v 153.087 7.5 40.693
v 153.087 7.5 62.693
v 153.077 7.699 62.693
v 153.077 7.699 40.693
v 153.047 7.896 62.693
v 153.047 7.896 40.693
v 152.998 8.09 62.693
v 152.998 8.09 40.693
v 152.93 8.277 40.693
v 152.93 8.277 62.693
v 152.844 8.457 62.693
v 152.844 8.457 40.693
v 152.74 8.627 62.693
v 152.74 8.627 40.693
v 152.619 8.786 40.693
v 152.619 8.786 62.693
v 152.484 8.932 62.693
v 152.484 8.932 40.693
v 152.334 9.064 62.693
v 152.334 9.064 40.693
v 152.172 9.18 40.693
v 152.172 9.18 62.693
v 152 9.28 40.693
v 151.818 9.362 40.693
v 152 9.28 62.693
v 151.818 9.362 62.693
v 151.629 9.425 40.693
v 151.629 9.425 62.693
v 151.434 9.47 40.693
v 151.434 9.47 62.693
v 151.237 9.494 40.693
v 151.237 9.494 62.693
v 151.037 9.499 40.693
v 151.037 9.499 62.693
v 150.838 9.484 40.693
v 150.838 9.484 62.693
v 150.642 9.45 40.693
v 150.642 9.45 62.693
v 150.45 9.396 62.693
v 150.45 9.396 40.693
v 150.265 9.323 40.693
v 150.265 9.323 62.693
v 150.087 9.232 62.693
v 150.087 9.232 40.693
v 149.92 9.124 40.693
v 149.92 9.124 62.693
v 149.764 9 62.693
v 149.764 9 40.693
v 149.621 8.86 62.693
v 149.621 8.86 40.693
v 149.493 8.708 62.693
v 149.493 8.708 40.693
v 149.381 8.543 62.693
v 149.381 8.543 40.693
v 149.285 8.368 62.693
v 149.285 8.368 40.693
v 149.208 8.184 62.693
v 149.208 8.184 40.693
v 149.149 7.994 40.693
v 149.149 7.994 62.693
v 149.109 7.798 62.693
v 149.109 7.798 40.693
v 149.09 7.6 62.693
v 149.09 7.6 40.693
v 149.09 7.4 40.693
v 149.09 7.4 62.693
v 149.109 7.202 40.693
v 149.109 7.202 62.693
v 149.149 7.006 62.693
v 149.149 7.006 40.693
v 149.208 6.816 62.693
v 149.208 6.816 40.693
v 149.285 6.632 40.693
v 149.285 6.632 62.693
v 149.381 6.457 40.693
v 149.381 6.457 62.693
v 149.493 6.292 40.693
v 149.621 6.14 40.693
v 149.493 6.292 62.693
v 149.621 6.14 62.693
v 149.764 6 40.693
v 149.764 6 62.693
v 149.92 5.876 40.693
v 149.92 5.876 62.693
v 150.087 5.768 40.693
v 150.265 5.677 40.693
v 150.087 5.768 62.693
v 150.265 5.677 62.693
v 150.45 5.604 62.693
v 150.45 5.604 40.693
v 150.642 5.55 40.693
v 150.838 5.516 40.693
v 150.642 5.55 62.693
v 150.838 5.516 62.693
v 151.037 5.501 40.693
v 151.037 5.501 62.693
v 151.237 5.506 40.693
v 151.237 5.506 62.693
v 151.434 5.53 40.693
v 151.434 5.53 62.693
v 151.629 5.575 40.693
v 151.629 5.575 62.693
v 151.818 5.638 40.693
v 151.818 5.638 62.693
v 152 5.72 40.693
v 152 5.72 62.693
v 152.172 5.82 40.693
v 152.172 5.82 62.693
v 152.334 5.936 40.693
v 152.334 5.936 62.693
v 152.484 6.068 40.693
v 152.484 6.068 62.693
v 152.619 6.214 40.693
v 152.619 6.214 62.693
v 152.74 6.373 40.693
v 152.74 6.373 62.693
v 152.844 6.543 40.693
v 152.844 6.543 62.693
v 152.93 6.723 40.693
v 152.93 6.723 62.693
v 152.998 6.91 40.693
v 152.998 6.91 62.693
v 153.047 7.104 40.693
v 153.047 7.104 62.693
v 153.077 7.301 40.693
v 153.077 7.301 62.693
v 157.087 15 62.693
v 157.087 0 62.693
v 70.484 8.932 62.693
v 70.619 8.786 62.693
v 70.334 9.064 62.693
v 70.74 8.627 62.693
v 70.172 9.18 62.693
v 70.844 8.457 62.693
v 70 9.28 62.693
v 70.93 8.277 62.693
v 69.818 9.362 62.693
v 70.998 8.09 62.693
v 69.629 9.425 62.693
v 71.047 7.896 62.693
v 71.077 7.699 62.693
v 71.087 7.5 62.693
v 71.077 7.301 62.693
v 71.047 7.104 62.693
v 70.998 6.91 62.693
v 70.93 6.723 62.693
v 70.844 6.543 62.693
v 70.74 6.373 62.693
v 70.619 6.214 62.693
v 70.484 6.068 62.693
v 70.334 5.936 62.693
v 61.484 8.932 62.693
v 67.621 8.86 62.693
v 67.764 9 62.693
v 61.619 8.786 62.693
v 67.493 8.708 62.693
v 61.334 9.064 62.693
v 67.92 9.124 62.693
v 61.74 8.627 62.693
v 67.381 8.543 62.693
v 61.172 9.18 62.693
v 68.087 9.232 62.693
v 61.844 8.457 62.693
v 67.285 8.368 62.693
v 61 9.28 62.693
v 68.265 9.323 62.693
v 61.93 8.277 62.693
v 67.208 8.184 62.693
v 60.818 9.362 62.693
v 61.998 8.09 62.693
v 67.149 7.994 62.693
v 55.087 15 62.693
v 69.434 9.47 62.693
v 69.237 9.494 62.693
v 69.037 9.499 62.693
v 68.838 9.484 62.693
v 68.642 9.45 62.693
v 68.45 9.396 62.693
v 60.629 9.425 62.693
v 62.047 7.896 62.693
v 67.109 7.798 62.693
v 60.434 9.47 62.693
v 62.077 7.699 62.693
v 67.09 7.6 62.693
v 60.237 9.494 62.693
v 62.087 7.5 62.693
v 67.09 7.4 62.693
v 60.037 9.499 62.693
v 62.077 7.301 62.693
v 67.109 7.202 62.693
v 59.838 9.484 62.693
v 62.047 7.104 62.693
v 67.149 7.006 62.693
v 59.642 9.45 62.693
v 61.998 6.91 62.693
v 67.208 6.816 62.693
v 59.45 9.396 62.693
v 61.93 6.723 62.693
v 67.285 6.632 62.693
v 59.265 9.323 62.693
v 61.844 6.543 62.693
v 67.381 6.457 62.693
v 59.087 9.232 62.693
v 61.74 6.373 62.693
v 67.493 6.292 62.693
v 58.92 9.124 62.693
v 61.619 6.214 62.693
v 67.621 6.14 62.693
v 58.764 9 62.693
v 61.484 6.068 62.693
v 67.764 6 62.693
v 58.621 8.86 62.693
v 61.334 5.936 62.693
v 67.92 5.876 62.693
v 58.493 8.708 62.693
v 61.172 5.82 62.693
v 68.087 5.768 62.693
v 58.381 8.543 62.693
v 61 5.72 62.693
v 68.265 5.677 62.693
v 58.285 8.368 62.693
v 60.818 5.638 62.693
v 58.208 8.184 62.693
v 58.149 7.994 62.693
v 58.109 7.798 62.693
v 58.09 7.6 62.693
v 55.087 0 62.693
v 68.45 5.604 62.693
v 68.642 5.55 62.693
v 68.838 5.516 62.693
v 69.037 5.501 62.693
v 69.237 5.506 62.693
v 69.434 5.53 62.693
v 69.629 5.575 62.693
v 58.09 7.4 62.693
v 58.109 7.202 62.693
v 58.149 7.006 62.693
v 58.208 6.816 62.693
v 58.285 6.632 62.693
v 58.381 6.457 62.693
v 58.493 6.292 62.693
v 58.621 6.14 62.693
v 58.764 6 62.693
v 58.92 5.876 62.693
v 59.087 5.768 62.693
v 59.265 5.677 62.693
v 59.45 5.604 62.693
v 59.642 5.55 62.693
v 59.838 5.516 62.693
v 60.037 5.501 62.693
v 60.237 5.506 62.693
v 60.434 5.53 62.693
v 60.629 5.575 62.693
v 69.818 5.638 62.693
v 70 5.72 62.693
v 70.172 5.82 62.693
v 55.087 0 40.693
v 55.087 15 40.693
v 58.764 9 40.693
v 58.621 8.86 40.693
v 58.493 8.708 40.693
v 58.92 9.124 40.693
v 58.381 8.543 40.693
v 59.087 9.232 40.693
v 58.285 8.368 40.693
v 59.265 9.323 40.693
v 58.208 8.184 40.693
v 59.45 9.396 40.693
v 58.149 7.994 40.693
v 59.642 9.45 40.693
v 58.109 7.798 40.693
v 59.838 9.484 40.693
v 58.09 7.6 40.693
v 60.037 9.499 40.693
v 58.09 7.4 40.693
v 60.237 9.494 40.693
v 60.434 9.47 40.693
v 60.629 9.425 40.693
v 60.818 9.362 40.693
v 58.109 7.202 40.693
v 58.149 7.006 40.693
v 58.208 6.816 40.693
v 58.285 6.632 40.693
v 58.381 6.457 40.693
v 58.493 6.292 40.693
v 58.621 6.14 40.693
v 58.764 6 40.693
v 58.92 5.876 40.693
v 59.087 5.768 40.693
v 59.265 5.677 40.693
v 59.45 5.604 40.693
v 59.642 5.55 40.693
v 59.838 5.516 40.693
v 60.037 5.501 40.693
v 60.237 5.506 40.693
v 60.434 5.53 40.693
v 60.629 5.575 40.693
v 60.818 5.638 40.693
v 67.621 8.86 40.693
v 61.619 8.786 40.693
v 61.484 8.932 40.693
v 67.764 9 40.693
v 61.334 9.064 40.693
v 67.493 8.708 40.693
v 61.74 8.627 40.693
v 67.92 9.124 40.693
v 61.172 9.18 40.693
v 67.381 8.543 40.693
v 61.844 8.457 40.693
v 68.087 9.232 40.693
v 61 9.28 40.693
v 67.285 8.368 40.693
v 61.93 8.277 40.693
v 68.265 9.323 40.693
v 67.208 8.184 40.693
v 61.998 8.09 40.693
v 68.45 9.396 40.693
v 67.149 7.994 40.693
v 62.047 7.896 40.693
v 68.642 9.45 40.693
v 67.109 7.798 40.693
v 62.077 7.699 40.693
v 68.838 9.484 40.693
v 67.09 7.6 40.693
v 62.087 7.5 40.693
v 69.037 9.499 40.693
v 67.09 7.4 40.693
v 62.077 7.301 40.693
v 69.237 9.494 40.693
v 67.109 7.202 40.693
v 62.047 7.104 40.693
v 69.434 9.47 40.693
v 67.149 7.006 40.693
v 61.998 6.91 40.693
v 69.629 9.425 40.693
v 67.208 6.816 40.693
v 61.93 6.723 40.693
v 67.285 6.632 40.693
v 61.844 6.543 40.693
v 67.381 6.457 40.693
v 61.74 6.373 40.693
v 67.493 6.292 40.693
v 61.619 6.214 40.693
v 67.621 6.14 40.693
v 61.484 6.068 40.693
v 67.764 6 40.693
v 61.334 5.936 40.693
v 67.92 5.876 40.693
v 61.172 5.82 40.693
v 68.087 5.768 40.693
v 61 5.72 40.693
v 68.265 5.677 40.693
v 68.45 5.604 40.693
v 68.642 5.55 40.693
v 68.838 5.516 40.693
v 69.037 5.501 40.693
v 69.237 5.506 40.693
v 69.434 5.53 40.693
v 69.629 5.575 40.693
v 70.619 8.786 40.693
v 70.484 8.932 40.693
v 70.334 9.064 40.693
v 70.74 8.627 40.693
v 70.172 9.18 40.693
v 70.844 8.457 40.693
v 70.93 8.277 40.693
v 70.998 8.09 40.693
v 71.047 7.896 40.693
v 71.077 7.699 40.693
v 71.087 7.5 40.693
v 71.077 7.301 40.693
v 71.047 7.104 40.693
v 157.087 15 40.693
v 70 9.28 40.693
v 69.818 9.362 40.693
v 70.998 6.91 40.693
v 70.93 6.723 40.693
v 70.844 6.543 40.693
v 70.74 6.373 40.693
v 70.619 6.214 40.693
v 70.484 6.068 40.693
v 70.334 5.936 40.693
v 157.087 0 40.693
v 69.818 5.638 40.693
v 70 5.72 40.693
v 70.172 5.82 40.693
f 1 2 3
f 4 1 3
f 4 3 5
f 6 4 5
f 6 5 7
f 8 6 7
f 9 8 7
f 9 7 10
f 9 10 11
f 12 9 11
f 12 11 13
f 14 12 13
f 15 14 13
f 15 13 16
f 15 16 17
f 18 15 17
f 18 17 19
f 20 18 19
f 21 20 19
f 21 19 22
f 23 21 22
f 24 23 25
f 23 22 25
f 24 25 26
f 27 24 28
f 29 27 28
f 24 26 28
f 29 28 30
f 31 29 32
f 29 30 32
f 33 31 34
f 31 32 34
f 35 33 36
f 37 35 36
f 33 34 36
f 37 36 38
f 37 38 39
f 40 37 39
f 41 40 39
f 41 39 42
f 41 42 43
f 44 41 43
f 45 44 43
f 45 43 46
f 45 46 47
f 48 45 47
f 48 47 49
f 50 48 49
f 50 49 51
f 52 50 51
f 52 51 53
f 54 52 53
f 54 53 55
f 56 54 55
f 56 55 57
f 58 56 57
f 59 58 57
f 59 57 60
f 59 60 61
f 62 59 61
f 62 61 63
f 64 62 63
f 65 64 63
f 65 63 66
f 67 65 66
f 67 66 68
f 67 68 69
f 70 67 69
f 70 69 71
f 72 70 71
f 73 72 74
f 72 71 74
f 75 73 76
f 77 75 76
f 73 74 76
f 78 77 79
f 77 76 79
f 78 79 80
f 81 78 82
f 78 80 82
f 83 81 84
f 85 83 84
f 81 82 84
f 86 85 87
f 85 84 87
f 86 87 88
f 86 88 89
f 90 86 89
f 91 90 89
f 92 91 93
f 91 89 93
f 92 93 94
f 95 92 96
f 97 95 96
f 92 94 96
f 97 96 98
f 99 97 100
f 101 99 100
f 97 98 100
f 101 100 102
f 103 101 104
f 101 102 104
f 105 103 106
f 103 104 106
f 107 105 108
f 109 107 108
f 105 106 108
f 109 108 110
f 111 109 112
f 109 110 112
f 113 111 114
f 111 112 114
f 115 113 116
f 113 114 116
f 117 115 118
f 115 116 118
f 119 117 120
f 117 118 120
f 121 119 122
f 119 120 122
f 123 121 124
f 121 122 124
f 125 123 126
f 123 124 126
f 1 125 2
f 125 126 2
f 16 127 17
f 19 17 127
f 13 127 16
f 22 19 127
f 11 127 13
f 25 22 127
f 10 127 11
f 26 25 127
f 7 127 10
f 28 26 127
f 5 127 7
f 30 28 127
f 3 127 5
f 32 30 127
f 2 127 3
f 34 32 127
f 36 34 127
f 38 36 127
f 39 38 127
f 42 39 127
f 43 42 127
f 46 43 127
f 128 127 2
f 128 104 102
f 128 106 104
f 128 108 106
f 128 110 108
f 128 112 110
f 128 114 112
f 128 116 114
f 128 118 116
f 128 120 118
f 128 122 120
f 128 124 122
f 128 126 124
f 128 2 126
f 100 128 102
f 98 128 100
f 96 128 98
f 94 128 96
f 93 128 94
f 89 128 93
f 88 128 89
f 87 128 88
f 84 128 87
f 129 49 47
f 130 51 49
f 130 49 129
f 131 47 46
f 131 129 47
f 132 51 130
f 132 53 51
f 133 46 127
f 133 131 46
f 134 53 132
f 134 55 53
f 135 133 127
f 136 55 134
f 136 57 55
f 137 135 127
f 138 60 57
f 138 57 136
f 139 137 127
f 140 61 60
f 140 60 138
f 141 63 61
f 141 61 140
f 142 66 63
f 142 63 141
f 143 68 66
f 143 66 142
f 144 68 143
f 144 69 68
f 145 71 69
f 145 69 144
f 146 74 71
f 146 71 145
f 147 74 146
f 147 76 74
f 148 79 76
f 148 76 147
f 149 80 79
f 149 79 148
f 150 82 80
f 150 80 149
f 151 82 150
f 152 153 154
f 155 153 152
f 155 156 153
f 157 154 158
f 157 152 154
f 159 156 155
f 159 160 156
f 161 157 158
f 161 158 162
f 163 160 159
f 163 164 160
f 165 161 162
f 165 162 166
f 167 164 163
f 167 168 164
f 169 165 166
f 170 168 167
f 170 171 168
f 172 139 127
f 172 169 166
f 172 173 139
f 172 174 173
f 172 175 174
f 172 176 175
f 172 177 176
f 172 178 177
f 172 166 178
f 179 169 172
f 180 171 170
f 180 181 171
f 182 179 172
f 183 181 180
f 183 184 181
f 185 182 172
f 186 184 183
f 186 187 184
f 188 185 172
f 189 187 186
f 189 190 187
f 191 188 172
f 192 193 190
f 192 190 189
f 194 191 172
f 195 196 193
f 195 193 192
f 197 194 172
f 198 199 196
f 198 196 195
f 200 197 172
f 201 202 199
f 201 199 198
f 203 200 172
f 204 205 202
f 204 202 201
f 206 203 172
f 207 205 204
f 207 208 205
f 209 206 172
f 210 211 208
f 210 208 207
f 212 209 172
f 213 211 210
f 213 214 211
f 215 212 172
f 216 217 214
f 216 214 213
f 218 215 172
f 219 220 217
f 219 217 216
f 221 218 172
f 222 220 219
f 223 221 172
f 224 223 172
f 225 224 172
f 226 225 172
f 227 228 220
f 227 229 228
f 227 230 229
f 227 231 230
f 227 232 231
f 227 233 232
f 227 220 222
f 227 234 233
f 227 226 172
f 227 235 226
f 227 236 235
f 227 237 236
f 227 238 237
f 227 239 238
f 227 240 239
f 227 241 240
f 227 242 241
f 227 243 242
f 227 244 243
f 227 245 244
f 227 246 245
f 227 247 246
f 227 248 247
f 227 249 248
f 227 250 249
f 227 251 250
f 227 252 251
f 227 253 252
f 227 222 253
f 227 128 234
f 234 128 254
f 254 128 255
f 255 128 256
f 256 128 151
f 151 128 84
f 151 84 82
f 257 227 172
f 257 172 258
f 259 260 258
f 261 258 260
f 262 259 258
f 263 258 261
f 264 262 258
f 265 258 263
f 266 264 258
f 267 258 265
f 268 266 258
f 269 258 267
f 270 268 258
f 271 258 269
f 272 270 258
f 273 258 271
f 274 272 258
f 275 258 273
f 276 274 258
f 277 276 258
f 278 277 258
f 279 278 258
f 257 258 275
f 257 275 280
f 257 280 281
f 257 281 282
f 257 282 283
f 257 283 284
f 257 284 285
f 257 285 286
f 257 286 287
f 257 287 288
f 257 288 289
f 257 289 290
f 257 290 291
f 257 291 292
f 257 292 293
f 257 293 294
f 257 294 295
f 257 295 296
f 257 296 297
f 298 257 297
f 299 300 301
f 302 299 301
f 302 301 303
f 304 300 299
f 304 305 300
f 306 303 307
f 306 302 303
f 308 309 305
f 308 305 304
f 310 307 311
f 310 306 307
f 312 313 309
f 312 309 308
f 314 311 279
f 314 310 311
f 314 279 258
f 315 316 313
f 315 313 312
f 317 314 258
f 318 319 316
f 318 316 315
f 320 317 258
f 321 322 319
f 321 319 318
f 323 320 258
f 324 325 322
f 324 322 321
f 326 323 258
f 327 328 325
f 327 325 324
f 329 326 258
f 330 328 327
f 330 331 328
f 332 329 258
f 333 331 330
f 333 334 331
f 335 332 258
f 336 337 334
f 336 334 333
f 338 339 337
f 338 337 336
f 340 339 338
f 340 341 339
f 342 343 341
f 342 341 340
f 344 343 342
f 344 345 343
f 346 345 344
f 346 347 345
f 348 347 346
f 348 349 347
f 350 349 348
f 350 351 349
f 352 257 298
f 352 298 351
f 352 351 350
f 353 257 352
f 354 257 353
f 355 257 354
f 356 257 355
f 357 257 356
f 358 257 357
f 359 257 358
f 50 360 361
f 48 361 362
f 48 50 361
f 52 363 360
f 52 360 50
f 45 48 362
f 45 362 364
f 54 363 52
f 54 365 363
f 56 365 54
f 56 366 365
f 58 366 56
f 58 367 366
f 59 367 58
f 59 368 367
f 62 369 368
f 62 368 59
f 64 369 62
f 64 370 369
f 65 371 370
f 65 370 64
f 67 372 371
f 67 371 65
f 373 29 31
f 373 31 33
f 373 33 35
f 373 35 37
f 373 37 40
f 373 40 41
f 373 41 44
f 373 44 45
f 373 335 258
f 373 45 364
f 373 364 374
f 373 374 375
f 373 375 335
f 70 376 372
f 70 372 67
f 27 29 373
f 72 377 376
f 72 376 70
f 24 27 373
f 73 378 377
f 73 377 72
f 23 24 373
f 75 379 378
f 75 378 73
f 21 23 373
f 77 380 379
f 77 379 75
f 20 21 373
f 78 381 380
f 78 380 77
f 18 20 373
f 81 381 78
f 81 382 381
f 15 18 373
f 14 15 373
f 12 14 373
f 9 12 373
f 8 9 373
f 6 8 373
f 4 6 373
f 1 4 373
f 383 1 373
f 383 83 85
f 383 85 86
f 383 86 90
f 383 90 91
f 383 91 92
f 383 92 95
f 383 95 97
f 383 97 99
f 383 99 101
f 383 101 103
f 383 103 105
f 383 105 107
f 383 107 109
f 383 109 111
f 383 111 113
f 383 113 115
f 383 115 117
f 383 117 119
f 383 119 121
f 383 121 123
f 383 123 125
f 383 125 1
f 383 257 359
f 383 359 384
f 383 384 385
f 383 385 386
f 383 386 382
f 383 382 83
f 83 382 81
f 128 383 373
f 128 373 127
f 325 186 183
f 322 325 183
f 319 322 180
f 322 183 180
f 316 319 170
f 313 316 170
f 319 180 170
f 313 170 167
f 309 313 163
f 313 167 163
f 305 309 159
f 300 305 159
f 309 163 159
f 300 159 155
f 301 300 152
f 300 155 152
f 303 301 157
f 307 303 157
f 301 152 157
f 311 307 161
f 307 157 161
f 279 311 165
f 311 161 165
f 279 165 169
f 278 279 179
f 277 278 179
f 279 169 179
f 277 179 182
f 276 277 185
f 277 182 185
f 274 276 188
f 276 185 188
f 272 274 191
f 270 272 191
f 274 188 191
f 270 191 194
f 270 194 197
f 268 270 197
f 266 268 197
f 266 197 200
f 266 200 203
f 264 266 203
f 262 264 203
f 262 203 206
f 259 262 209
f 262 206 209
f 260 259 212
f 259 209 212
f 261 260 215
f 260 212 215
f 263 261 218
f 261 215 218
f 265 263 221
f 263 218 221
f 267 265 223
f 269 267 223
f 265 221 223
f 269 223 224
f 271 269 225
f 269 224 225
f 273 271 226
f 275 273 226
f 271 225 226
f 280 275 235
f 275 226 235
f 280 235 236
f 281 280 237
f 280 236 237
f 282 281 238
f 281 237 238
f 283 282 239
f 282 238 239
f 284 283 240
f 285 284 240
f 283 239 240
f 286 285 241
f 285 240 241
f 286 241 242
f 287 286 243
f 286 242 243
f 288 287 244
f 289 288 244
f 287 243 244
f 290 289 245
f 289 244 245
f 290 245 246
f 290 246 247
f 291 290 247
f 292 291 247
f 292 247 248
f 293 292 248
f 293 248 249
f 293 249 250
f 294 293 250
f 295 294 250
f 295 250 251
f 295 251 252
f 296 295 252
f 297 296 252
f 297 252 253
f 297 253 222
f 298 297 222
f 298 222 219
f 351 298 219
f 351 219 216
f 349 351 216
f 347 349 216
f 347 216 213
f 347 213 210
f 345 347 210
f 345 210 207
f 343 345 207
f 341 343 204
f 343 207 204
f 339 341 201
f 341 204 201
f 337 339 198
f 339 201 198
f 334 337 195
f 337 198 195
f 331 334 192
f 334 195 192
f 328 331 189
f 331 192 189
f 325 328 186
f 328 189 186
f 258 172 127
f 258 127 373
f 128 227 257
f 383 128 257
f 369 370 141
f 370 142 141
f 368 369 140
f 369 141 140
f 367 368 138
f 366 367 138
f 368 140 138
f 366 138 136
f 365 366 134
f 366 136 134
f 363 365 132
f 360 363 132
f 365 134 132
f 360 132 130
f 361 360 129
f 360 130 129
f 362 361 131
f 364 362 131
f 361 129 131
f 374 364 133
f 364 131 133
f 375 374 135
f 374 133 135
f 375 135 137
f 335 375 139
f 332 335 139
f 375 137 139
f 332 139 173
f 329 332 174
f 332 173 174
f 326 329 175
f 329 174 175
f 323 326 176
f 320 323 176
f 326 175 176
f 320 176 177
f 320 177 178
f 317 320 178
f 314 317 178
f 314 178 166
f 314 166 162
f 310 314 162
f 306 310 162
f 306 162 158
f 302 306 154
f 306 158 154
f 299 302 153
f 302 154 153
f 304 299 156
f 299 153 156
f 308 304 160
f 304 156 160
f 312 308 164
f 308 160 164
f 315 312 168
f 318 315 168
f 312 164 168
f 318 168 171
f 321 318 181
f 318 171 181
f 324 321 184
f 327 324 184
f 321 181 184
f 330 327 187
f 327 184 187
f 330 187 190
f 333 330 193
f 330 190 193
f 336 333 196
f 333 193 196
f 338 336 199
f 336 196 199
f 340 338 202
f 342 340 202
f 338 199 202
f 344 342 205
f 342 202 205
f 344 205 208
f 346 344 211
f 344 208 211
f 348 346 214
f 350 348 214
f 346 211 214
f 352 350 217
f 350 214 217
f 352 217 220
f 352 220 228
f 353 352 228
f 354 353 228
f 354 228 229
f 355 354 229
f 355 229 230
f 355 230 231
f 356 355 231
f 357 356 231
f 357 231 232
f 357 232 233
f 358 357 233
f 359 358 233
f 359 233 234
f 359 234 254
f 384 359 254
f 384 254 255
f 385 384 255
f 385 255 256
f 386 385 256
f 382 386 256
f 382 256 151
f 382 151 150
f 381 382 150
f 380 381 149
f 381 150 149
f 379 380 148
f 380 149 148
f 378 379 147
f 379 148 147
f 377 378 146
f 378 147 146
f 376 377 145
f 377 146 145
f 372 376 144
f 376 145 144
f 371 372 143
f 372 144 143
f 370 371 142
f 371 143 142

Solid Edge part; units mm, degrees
sketch "Sketch1" plane through (0, 0, 0) normal (0, -1, 0) x (1, 0, 0)
  line L0 (55.0871, 62.6934) -> (55.0871, 40.6934)
  line L1 (55.0871, 40.6934) -> (157.0871, 40.6934)
  line L2 (157.0871, 40.6934) -> (157.0871, 62.6934)
  line L3 (157.0871, 62.6934) -> (55.0871, 62.6934)
  dimension "D1" = 102
  dimension "D2" = 22
extrude "Protrusion1" add sketch "Sketch1" against normal blind 15
sketch "Sketch2" plane through (106.0871, 7.5, 62.6934) normal (0, 0, 1) x (1, 0, 0)
  circle A0 centre (-46, 0) radius 2
  circle A1 centre (-37, 0) radius 2
  circle A2 centre (45, 0) radius 2
  dimension "D1" = 5
  dimension "D2" = 4
  dimension "D3" = 9
  dimension "D4" = 82
extrude "Cutout1" cut sketch "Sketch2" against normal through all
